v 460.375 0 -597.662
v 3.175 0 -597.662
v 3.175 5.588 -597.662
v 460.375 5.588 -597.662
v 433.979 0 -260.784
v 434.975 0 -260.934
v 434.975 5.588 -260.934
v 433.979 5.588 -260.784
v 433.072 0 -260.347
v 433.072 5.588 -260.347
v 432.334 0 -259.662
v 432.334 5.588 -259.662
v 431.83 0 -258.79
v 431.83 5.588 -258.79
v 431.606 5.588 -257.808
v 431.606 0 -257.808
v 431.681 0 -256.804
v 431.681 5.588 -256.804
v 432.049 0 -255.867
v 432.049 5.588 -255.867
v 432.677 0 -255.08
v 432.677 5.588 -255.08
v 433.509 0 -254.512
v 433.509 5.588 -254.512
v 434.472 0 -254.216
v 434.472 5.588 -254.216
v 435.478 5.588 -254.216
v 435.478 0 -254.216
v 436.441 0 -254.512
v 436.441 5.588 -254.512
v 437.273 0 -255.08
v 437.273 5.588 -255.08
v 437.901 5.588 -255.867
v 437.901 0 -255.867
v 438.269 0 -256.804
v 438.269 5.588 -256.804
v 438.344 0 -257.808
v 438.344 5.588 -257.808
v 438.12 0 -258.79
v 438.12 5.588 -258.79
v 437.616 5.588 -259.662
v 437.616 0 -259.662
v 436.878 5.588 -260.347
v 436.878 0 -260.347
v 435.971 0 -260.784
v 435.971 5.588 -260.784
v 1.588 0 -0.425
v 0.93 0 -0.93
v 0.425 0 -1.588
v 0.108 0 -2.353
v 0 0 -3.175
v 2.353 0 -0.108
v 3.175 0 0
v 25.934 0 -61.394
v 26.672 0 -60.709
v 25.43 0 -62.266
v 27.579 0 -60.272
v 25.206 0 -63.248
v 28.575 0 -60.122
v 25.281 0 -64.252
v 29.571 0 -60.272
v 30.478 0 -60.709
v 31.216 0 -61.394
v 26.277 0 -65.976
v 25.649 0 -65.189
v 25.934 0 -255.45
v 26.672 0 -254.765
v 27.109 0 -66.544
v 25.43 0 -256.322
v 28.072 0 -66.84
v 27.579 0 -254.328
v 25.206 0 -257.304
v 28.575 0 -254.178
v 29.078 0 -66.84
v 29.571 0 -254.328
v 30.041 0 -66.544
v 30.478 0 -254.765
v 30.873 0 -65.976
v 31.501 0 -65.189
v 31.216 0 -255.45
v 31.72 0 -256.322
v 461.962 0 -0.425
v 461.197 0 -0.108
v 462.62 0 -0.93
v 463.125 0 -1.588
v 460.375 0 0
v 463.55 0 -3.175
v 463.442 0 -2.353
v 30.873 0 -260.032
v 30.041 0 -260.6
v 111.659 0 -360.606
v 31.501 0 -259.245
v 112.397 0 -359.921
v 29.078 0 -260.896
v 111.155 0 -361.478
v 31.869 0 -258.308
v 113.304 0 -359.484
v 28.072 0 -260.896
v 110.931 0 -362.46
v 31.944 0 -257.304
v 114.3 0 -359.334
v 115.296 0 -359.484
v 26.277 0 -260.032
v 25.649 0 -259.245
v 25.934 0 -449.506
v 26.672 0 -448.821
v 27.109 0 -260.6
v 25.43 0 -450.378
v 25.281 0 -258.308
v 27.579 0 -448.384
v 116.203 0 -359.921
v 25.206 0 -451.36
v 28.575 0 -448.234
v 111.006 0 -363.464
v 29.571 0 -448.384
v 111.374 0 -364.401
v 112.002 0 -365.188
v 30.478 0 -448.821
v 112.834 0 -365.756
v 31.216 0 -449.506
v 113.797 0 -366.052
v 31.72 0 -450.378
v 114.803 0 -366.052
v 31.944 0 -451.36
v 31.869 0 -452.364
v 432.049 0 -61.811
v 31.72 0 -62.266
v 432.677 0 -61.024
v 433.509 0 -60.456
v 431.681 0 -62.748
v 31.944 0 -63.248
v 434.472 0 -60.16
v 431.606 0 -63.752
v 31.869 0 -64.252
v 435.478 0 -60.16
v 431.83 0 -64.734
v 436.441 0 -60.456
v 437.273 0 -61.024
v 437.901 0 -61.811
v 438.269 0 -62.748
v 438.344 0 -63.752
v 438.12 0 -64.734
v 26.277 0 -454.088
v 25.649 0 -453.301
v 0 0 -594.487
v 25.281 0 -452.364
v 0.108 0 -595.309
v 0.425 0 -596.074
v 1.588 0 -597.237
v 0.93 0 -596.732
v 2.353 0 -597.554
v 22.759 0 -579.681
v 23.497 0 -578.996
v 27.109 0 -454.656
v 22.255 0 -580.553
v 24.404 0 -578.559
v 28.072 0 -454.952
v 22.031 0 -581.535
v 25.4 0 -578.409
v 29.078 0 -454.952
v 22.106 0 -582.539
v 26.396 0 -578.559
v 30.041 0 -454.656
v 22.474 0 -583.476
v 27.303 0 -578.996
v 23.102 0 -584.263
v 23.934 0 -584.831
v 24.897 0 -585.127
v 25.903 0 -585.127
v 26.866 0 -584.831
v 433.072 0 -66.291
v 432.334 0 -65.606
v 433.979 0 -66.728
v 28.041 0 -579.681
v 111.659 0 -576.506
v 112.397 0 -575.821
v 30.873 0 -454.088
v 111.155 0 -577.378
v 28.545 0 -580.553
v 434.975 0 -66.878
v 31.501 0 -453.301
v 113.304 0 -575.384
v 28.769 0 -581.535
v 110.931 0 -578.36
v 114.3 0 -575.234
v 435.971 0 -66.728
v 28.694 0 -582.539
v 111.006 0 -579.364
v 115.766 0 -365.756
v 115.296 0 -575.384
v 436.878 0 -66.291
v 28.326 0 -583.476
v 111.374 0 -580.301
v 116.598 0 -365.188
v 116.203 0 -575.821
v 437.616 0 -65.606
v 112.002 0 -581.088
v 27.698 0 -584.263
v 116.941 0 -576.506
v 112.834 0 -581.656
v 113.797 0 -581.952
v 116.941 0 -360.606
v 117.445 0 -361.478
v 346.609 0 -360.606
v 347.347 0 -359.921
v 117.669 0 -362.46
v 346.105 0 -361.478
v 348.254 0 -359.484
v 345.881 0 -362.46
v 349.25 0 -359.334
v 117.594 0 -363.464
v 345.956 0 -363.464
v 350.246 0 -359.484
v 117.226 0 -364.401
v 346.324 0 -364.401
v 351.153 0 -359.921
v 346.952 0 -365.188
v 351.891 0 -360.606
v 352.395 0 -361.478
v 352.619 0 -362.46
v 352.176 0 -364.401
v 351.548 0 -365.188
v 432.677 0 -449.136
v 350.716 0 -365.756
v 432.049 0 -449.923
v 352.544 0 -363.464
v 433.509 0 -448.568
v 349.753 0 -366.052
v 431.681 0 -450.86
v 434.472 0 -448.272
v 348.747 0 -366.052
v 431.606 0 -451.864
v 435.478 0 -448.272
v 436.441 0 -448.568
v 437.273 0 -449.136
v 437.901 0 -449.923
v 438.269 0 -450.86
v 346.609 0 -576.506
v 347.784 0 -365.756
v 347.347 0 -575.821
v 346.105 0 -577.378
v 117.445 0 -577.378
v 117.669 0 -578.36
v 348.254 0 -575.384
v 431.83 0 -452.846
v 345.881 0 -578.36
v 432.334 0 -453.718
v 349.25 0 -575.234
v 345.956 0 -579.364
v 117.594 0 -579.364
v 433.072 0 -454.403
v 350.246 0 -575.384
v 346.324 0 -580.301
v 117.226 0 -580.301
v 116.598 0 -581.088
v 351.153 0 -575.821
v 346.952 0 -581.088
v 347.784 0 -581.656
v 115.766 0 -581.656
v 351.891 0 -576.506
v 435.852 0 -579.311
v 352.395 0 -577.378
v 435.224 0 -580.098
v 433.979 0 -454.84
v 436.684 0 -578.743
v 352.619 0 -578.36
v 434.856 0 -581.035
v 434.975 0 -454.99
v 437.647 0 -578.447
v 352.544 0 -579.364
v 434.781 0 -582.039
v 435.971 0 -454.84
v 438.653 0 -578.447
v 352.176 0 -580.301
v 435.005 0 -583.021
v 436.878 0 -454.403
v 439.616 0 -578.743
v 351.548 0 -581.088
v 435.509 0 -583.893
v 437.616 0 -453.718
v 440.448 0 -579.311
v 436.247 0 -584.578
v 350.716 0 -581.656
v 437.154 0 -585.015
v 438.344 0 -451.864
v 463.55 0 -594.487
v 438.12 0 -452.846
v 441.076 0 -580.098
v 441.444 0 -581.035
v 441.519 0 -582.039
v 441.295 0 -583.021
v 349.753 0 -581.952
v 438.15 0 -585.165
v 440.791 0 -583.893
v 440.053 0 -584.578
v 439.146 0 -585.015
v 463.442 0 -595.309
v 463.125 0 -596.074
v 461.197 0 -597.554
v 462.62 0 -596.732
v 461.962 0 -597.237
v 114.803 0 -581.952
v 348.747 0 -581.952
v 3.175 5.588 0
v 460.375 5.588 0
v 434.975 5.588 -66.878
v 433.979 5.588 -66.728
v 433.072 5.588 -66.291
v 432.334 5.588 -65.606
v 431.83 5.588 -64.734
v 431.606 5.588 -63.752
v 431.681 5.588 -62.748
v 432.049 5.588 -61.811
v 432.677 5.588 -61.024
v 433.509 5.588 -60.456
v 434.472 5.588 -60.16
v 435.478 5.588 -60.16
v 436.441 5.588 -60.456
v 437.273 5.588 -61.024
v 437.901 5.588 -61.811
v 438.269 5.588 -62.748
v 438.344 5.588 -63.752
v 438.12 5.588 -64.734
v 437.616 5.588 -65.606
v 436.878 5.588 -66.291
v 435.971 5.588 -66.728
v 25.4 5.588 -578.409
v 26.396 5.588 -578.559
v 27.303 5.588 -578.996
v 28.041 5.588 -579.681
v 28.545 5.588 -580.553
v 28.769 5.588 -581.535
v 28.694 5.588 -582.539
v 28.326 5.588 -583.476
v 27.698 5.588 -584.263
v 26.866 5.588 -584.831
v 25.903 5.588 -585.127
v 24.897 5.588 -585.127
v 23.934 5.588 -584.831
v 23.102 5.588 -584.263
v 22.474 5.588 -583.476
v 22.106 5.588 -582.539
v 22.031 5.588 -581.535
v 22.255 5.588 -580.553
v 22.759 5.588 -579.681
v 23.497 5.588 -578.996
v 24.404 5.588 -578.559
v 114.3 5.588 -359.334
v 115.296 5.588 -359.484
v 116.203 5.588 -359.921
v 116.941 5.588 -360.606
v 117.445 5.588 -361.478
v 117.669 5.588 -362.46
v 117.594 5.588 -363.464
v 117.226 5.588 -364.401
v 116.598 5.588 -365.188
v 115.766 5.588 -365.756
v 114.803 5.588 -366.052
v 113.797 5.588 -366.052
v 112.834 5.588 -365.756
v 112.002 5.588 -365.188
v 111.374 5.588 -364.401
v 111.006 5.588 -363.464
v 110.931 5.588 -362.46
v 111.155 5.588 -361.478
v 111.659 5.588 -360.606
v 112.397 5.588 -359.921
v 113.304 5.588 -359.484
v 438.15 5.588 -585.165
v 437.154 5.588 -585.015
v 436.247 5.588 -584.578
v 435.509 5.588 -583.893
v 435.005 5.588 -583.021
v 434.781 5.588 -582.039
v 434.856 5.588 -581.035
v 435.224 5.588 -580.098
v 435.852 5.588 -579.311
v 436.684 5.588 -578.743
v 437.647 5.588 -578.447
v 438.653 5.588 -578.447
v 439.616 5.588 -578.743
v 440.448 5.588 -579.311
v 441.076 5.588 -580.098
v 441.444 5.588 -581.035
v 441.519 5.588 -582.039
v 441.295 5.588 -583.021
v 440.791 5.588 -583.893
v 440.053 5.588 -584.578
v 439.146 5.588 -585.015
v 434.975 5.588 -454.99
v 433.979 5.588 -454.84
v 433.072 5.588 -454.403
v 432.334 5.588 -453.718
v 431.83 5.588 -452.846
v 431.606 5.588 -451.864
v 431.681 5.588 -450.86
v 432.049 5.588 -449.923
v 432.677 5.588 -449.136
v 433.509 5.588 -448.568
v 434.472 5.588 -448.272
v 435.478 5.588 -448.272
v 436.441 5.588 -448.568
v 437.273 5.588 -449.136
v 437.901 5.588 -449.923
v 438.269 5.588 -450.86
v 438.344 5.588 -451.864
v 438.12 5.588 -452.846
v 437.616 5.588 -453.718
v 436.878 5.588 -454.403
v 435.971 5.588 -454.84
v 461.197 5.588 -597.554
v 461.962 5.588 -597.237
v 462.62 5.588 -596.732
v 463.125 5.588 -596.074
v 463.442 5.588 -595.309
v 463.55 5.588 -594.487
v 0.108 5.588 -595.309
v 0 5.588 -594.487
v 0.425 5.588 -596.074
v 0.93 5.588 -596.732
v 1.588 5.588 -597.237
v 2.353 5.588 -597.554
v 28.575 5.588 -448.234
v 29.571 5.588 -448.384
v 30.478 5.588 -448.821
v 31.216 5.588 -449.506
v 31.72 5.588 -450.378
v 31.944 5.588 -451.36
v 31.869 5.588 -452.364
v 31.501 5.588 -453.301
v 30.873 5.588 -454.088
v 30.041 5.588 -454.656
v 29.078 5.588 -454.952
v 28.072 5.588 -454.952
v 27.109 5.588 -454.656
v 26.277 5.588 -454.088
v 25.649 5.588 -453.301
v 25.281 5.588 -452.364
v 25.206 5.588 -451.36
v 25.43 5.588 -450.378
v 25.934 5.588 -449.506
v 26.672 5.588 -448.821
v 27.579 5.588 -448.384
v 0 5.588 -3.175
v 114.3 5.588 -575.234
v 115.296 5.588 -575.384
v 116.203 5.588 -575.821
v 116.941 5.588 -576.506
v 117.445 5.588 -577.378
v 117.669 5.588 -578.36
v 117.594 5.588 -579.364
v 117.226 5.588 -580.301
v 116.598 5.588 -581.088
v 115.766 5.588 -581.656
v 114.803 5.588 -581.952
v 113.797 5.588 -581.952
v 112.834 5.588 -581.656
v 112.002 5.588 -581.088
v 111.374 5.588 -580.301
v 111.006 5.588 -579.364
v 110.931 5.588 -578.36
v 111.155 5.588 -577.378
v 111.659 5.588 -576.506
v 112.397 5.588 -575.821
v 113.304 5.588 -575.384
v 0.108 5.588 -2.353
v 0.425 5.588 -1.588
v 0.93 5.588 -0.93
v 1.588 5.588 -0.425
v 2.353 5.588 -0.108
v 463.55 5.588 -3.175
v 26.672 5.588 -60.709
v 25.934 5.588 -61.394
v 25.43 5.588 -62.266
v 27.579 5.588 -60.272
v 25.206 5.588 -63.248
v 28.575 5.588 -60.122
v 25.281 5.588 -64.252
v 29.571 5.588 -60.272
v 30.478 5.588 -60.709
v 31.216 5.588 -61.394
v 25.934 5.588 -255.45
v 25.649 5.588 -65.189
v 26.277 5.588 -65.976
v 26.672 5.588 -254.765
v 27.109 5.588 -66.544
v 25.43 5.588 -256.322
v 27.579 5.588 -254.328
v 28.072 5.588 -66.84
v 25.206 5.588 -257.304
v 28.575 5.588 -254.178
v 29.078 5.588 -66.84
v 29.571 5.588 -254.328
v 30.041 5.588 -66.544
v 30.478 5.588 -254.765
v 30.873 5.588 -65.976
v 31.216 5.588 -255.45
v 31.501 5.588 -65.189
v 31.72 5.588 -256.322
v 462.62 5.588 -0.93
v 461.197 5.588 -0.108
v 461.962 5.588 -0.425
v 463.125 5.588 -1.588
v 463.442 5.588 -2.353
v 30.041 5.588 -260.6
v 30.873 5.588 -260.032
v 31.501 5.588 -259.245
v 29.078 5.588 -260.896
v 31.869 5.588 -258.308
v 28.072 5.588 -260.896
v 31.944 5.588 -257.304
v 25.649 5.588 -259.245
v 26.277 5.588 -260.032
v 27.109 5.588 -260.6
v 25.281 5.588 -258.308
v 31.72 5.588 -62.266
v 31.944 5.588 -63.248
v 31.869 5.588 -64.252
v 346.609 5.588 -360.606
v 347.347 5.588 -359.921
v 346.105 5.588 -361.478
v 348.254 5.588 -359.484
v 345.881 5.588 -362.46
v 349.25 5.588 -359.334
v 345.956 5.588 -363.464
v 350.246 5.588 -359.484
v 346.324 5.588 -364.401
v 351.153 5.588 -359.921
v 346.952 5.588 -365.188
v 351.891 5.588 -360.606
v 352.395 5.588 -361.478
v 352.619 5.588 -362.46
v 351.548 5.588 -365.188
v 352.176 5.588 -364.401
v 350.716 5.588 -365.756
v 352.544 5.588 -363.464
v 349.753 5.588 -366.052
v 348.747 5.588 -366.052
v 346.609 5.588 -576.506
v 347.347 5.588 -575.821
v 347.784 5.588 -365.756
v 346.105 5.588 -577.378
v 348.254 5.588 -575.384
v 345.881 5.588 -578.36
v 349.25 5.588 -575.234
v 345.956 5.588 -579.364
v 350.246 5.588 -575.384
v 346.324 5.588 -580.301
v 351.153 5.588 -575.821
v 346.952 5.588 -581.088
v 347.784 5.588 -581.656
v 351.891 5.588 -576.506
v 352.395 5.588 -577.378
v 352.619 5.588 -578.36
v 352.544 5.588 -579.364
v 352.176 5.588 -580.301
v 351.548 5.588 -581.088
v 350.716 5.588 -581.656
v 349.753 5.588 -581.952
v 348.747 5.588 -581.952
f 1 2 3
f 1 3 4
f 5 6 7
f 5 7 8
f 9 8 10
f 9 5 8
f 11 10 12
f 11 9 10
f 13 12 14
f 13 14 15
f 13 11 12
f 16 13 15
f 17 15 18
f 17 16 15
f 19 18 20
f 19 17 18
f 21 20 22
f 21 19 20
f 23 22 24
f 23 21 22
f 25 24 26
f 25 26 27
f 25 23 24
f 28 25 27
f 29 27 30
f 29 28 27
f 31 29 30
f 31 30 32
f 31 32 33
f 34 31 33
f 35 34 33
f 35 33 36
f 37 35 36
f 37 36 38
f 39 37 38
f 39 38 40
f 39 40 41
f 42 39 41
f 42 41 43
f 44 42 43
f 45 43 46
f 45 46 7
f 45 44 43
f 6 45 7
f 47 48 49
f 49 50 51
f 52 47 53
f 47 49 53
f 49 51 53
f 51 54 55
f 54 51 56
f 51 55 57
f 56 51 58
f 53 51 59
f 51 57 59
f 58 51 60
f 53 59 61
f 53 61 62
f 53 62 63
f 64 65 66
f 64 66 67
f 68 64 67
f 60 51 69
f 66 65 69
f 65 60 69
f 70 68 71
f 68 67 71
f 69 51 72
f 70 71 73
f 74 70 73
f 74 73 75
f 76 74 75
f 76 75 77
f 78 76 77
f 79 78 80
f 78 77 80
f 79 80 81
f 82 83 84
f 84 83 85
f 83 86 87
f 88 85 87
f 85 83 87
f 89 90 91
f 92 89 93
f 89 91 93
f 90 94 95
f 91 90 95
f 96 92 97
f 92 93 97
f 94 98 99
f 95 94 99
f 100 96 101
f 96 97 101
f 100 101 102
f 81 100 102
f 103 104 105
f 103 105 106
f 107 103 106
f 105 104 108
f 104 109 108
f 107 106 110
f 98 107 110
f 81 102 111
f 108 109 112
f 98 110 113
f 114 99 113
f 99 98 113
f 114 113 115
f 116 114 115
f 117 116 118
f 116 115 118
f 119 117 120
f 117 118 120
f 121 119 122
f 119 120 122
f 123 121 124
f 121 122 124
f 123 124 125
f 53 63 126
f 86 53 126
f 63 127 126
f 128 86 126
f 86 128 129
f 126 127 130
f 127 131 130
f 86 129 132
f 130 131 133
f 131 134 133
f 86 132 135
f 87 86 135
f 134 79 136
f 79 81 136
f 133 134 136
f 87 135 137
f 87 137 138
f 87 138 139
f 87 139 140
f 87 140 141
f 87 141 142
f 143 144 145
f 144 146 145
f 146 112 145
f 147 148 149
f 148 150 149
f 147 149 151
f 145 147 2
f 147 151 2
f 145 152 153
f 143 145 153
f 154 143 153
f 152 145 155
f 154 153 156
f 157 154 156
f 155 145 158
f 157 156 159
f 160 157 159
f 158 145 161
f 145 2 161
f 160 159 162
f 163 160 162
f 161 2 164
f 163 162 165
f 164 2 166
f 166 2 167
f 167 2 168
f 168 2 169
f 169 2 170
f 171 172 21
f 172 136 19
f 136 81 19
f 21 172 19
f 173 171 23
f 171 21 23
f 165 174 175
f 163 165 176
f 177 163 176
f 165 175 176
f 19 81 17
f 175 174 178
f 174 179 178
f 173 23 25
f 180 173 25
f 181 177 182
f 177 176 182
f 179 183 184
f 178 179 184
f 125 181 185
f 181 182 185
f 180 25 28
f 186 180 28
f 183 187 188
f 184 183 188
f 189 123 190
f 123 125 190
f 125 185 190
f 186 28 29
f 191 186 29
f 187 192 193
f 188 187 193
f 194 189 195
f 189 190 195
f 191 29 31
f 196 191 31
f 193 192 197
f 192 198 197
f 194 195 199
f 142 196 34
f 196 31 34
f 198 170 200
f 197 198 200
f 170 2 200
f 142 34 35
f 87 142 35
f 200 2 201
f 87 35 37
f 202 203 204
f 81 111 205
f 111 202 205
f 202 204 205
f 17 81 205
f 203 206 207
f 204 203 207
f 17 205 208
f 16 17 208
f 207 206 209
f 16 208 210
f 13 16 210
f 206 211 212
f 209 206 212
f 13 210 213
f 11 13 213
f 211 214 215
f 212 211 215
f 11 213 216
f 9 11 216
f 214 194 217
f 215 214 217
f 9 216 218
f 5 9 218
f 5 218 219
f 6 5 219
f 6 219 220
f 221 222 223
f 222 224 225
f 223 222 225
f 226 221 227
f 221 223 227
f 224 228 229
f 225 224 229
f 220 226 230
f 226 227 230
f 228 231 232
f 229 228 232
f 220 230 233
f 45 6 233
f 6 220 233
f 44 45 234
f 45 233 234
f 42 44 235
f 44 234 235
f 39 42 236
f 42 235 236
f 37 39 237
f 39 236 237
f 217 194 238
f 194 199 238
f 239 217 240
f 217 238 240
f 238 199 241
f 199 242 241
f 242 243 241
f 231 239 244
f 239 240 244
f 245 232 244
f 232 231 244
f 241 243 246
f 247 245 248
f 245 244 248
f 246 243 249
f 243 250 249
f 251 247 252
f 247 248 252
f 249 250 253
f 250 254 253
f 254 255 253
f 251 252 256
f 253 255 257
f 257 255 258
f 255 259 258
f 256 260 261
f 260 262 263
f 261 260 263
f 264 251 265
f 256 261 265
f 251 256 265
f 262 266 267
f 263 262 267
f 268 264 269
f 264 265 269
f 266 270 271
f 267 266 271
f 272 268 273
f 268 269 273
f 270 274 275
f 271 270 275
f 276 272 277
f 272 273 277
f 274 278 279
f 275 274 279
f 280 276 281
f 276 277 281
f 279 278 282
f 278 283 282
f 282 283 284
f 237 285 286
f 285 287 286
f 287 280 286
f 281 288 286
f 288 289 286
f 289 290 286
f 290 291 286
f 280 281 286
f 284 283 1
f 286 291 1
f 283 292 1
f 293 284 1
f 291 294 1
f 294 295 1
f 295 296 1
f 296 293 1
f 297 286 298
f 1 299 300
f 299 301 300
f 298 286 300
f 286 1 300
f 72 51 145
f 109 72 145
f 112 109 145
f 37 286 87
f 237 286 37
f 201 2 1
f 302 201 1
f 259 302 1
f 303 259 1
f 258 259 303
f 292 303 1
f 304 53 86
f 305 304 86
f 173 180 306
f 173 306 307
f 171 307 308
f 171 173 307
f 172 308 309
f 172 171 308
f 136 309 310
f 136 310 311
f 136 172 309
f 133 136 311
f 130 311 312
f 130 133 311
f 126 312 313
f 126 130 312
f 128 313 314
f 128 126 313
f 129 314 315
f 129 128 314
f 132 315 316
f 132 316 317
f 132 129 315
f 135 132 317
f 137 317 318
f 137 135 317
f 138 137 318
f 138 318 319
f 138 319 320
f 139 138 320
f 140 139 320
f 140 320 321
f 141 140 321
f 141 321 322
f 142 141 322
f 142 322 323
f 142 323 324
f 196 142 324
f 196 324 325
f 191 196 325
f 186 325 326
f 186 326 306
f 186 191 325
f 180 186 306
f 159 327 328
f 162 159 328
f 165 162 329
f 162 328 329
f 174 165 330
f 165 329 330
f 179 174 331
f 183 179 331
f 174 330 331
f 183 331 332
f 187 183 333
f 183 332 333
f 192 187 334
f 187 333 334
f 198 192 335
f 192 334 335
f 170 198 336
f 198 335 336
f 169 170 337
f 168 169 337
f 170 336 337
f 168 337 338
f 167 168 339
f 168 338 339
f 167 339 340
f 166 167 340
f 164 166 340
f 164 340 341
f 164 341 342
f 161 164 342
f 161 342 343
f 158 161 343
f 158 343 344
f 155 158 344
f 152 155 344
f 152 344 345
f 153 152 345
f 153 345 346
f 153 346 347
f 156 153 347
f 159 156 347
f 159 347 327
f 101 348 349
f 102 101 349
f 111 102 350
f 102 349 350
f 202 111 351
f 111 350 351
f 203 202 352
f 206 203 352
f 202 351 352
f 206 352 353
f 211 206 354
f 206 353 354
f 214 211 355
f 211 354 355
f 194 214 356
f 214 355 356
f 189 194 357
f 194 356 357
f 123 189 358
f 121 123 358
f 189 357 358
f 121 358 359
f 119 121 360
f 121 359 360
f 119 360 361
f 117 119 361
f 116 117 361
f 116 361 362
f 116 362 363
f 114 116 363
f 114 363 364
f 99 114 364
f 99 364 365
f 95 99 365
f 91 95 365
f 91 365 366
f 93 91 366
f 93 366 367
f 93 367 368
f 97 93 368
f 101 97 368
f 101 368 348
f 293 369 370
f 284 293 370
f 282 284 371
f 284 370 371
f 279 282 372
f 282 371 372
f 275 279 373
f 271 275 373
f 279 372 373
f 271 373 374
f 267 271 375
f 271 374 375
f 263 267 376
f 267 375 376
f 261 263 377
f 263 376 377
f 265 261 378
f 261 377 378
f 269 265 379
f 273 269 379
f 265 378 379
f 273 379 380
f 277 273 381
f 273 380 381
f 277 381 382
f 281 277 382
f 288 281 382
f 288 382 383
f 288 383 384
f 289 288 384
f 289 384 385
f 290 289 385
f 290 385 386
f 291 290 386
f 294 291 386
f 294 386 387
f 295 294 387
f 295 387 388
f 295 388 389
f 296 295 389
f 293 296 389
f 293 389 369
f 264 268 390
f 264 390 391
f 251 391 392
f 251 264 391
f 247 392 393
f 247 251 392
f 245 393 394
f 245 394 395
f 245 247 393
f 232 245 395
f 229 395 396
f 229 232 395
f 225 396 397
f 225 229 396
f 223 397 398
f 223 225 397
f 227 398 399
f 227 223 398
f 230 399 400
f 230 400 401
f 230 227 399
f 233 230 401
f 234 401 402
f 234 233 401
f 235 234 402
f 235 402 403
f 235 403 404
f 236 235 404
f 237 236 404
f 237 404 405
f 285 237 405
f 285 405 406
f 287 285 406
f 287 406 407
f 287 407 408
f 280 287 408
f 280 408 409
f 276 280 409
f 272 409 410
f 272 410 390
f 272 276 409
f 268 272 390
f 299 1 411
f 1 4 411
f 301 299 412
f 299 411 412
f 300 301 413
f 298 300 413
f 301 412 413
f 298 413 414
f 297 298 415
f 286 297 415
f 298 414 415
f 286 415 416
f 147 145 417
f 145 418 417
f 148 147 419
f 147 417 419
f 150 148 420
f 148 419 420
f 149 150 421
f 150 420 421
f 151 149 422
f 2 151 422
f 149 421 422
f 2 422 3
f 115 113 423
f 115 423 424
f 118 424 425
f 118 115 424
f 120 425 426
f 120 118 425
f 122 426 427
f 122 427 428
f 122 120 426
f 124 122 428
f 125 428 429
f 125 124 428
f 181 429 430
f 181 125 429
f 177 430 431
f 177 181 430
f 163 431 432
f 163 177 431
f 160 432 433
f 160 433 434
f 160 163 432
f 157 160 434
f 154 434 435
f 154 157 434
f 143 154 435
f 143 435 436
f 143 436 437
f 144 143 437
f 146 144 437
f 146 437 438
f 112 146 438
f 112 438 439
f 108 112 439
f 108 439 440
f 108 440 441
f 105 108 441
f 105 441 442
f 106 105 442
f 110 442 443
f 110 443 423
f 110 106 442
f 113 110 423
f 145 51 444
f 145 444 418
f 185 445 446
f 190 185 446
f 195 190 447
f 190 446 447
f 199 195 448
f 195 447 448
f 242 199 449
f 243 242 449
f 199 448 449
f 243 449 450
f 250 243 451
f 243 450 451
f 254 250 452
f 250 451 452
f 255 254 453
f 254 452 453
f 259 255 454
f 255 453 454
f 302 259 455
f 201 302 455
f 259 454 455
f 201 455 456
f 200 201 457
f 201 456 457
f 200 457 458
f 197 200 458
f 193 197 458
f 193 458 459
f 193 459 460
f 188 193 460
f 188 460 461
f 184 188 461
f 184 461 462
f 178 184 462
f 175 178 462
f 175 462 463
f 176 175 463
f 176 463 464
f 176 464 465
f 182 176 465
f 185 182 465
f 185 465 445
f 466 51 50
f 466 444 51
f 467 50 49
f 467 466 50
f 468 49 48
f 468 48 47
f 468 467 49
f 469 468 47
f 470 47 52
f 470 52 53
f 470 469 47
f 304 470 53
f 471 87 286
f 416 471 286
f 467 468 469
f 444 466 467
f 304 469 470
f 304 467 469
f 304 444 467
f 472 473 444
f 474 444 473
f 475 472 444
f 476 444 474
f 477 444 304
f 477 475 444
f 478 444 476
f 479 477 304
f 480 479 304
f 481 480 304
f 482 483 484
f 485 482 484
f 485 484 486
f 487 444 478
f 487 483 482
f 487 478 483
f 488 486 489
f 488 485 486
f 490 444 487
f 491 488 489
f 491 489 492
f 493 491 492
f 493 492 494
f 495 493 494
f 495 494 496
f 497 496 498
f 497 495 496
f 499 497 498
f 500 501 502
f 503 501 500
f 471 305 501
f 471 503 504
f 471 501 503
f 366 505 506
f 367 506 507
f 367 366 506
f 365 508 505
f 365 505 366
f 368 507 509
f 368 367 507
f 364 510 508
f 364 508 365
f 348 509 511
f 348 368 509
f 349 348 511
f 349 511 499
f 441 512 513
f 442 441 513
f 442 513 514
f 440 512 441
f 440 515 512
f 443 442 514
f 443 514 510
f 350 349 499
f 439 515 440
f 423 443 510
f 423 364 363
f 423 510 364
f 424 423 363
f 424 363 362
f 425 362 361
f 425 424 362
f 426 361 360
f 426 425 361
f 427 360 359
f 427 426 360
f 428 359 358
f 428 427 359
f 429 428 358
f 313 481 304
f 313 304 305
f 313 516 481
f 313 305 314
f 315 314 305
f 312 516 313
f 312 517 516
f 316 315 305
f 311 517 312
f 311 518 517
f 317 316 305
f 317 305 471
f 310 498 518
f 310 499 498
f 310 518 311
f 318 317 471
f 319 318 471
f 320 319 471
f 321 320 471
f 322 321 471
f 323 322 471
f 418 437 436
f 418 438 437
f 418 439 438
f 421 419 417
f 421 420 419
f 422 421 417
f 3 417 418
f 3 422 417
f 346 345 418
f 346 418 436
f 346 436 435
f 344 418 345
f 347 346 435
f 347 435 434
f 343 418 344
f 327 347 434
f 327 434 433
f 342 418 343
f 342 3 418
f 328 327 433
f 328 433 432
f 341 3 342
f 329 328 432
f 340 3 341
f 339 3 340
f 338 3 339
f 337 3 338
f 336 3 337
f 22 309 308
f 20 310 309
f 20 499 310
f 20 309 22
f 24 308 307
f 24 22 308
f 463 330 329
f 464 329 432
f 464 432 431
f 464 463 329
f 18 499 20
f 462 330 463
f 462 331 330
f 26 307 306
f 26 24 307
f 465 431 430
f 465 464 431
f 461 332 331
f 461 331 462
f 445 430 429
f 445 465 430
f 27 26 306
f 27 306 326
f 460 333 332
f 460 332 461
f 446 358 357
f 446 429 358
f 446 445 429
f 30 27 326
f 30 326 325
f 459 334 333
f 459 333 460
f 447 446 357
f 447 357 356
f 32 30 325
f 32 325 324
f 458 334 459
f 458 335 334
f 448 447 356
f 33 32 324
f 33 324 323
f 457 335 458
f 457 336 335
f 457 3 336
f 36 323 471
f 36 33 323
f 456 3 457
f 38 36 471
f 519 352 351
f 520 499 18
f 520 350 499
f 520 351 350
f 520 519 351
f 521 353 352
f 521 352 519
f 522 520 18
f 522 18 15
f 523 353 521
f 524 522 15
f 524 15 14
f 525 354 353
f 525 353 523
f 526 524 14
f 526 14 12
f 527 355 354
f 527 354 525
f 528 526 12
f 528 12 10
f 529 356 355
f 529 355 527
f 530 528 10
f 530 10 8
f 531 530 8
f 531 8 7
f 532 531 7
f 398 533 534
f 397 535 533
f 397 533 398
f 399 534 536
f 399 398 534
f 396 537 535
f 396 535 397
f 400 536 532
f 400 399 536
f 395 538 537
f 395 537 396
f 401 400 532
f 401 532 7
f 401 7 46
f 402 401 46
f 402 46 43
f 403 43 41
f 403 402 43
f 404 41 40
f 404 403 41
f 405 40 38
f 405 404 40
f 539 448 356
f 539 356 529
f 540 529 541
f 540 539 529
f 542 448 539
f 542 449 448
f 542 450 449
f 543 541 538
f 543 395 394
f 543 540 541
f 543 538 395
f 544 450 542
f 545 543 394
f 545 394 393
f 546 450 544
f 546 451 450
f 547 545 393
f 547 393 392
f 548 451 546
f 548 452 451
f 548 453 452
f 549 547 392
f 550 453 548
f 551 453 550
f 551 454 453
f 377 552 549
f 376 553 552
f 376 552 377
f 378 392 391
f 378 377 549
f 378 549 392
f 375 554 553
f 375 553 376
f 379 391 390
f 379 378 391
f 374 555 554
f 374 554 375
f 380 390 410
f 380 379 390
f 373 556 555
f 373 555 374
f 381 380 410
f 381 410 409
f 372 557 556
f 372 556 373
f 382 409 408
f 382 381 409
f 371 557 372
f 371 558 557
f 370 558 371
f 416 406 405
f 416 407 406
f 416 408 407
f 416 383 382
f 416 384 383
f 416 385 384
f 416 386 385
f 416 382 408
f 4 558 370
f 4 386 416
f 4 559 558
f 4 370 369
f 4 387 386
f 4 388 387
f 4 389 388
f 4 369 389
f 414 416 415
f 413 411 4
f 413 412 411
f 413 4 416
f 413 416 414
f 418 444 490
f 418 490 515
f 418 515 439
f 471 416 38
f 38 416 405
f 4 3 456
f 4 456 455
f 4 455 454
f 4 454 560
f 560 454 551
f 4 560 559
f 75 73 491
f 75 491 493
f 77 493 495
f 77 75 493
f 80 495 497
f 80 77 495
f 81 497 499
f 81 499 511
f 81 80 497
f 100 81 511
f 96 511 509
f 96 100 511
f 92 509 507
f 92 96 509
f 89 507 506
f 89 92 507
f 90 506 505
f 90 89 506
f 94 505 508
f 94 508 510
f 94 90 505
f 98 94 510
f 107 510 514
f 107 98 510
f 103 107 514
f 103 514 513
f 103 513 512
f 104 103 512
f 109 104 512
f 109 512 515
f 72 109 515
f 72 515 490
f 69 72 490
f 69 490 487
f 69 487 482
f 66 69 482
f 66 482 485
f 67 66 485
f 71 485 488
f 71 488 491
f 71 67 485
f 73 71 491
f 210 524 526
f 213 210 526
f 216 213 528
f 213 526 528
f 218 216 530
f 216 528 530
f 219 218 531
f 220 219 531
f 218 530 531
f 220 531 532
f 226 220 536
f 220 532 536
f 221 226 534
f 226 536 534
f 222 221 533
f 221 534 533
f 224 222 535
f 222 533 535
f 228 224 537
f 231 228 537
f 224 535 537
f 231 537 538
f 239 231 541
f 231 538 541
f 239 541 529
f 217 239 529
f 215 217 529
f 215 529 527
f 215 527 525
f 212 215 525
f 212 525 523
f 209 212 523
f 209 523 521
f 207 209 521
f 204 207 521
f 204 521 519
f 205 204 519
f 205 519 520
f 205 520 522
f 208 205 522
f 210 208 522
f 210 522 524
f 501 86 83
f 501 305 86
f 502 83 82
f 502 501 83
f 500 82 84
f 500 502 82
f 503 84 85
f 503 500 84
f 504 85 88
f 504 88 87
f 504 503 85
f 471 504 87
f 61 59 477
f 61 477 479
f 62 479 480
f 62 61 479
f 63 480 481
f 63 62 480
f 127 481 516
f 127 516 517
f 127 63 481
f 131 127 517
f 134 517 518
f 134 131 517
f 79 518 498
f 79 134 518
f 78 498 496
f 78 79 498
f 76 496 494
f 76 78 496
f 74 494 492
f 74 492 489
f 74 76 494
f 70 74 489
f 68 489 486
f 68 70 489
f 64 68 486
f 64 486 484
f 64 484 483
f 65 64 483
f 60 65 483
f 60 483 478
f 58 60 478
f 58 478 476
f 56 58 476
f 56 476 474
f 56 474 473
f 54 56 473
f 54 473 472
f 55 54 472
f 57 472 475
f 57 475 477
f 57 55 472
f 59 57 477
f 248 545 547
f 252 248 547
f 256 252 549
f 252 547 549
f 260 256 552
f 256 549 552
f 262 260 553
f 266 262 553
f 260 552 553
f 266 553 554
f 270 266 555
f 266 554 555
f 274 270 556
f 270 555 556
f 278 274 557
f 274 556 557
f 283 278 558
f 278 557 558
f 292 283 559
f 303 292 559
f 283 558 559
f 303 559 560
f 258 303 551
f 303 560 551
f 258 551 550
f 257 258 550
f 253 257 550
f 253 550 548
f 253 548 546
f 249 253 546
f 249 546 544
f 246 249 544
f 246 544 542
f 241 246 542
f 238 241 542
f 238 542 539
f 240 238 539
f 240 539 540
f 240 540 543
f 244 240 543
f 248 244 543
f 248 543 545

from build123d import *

# Parameters (mm, degrees)
SKETCH1_W           = 463.55
SKETCH1_H           = 597.662
SKETCH1_R           = 3.3782
BOSS_EXTRUDE1_DEPTH = 5.588
FILLET1_R           = 3.175
SKETCH2_R           = 3.3782
CUT_EXTRUDE1_DEPTH  = 757.379332404
SKETCH3_R           = 3.3782
CUT_EXTRUDE2_DEPTH  = 757.379332404


with BuildPart() as part:
    # Sketch1 → Boss-Extrude1 (new body)
    with BuildSketch(Plane(origin=(0, 0, 0), x_dir=(1, 0, 0), z_dir=(0, 1, 0))):
        with Locations((231.775, 298.831)):
            Rectangle(SKETCH1_W, SKETCH1_H)
        with Locations(Location((28.575, 63.5, 0), (0, 0, 270))):
            Circle(SKETCH1_R, mode=Mode.SUBTRACT)
        with Locations(Location((28.575, 257.556, 0), (0, 0, 270))):
            Circle(SKETCH1_R, mode=Mode.SUBTRACT)
        with Locations(Location((28.575, 451.612, 0), (0, 0, 270))):
            Circle(SKETCH1_R, mode=Mode.SUBTRACT)
        with Locations(Location((434.975, 451.612, 0), (0, 0, 90))):
            Circle(SKETCH1_R, mode=Mode.SUBTRACT)
        with Locations(Location((434.975, 257.556, 0), (0, 0, 90))):
            Circle(SKETCH1_R, mode=Mode.SUBTRACT)
        with Locations(Location((434.975, 63.5, 0), (0, 0, 90))):
            Circle(SKETCH1_R, mode=Mode.SUBTRACT)
    extrude(amount=BOSS_EXTRUDE1_DEPTH)

    # Fillet1
    fillet1_edges = [part.edges().sort_by_distance(p)[0] for p in [
        (0, 2.794, -597.662),
        (463.55, 2.794, -597.662),
        (463.55, 2.794, 0),
        (0, 2.794, 0),
    ]]
    fillet(fillet1_edges, radius=FILLET1_R)

    # Sketch2 → Cut-Extrude1 (cut, through all)
    with BuildSketch(Plane(origin=(0, 5.588, 0), x_dir=(1, 0, 0), z_dir=(0, 1, 0))):
        with Locations(Location((25.4, 581.787, 0), (0, 0, 270))):
            Circle(SKETCH2_R)
        with Locations(Location((438.15, 581.787, 0), (0, 0, 90))):
            Circle(SKETCH2_R)
    extrude(amount=-CUT_EXTRUDE1_DEPTH, mode=Mode.SUBTRACT)

    # Sketch3 → Cut-Extrude2 (cut, through all)
    with BuildSketch(Plane(origin=(0, 5.588, 0), x_dir=(1, 0, 0), z_dir=(0, 1, 0))):
        with Locations(Location((114.3, 578.612, 0), (0, 0, 270))):
            Circle(SKETCH3_R)
        with Locations(Location((349.25, 578.612, 0), (0, 0, 270))):
            Circle(SKETCH3_R)
        with Locations(Location((114.3, 362.712, 0), (0, 0, 270))):
            Circle(SKETCH3_R)
        with Locations(Location((349.25, 362.712, 0), (0, 0, 270))):
            Circle(SKETCH3_R)
    extrude(amount=-CUT_EXTRUDE2_DEPTH, mode=Mode.SUBTRACT)


solid = part.part
